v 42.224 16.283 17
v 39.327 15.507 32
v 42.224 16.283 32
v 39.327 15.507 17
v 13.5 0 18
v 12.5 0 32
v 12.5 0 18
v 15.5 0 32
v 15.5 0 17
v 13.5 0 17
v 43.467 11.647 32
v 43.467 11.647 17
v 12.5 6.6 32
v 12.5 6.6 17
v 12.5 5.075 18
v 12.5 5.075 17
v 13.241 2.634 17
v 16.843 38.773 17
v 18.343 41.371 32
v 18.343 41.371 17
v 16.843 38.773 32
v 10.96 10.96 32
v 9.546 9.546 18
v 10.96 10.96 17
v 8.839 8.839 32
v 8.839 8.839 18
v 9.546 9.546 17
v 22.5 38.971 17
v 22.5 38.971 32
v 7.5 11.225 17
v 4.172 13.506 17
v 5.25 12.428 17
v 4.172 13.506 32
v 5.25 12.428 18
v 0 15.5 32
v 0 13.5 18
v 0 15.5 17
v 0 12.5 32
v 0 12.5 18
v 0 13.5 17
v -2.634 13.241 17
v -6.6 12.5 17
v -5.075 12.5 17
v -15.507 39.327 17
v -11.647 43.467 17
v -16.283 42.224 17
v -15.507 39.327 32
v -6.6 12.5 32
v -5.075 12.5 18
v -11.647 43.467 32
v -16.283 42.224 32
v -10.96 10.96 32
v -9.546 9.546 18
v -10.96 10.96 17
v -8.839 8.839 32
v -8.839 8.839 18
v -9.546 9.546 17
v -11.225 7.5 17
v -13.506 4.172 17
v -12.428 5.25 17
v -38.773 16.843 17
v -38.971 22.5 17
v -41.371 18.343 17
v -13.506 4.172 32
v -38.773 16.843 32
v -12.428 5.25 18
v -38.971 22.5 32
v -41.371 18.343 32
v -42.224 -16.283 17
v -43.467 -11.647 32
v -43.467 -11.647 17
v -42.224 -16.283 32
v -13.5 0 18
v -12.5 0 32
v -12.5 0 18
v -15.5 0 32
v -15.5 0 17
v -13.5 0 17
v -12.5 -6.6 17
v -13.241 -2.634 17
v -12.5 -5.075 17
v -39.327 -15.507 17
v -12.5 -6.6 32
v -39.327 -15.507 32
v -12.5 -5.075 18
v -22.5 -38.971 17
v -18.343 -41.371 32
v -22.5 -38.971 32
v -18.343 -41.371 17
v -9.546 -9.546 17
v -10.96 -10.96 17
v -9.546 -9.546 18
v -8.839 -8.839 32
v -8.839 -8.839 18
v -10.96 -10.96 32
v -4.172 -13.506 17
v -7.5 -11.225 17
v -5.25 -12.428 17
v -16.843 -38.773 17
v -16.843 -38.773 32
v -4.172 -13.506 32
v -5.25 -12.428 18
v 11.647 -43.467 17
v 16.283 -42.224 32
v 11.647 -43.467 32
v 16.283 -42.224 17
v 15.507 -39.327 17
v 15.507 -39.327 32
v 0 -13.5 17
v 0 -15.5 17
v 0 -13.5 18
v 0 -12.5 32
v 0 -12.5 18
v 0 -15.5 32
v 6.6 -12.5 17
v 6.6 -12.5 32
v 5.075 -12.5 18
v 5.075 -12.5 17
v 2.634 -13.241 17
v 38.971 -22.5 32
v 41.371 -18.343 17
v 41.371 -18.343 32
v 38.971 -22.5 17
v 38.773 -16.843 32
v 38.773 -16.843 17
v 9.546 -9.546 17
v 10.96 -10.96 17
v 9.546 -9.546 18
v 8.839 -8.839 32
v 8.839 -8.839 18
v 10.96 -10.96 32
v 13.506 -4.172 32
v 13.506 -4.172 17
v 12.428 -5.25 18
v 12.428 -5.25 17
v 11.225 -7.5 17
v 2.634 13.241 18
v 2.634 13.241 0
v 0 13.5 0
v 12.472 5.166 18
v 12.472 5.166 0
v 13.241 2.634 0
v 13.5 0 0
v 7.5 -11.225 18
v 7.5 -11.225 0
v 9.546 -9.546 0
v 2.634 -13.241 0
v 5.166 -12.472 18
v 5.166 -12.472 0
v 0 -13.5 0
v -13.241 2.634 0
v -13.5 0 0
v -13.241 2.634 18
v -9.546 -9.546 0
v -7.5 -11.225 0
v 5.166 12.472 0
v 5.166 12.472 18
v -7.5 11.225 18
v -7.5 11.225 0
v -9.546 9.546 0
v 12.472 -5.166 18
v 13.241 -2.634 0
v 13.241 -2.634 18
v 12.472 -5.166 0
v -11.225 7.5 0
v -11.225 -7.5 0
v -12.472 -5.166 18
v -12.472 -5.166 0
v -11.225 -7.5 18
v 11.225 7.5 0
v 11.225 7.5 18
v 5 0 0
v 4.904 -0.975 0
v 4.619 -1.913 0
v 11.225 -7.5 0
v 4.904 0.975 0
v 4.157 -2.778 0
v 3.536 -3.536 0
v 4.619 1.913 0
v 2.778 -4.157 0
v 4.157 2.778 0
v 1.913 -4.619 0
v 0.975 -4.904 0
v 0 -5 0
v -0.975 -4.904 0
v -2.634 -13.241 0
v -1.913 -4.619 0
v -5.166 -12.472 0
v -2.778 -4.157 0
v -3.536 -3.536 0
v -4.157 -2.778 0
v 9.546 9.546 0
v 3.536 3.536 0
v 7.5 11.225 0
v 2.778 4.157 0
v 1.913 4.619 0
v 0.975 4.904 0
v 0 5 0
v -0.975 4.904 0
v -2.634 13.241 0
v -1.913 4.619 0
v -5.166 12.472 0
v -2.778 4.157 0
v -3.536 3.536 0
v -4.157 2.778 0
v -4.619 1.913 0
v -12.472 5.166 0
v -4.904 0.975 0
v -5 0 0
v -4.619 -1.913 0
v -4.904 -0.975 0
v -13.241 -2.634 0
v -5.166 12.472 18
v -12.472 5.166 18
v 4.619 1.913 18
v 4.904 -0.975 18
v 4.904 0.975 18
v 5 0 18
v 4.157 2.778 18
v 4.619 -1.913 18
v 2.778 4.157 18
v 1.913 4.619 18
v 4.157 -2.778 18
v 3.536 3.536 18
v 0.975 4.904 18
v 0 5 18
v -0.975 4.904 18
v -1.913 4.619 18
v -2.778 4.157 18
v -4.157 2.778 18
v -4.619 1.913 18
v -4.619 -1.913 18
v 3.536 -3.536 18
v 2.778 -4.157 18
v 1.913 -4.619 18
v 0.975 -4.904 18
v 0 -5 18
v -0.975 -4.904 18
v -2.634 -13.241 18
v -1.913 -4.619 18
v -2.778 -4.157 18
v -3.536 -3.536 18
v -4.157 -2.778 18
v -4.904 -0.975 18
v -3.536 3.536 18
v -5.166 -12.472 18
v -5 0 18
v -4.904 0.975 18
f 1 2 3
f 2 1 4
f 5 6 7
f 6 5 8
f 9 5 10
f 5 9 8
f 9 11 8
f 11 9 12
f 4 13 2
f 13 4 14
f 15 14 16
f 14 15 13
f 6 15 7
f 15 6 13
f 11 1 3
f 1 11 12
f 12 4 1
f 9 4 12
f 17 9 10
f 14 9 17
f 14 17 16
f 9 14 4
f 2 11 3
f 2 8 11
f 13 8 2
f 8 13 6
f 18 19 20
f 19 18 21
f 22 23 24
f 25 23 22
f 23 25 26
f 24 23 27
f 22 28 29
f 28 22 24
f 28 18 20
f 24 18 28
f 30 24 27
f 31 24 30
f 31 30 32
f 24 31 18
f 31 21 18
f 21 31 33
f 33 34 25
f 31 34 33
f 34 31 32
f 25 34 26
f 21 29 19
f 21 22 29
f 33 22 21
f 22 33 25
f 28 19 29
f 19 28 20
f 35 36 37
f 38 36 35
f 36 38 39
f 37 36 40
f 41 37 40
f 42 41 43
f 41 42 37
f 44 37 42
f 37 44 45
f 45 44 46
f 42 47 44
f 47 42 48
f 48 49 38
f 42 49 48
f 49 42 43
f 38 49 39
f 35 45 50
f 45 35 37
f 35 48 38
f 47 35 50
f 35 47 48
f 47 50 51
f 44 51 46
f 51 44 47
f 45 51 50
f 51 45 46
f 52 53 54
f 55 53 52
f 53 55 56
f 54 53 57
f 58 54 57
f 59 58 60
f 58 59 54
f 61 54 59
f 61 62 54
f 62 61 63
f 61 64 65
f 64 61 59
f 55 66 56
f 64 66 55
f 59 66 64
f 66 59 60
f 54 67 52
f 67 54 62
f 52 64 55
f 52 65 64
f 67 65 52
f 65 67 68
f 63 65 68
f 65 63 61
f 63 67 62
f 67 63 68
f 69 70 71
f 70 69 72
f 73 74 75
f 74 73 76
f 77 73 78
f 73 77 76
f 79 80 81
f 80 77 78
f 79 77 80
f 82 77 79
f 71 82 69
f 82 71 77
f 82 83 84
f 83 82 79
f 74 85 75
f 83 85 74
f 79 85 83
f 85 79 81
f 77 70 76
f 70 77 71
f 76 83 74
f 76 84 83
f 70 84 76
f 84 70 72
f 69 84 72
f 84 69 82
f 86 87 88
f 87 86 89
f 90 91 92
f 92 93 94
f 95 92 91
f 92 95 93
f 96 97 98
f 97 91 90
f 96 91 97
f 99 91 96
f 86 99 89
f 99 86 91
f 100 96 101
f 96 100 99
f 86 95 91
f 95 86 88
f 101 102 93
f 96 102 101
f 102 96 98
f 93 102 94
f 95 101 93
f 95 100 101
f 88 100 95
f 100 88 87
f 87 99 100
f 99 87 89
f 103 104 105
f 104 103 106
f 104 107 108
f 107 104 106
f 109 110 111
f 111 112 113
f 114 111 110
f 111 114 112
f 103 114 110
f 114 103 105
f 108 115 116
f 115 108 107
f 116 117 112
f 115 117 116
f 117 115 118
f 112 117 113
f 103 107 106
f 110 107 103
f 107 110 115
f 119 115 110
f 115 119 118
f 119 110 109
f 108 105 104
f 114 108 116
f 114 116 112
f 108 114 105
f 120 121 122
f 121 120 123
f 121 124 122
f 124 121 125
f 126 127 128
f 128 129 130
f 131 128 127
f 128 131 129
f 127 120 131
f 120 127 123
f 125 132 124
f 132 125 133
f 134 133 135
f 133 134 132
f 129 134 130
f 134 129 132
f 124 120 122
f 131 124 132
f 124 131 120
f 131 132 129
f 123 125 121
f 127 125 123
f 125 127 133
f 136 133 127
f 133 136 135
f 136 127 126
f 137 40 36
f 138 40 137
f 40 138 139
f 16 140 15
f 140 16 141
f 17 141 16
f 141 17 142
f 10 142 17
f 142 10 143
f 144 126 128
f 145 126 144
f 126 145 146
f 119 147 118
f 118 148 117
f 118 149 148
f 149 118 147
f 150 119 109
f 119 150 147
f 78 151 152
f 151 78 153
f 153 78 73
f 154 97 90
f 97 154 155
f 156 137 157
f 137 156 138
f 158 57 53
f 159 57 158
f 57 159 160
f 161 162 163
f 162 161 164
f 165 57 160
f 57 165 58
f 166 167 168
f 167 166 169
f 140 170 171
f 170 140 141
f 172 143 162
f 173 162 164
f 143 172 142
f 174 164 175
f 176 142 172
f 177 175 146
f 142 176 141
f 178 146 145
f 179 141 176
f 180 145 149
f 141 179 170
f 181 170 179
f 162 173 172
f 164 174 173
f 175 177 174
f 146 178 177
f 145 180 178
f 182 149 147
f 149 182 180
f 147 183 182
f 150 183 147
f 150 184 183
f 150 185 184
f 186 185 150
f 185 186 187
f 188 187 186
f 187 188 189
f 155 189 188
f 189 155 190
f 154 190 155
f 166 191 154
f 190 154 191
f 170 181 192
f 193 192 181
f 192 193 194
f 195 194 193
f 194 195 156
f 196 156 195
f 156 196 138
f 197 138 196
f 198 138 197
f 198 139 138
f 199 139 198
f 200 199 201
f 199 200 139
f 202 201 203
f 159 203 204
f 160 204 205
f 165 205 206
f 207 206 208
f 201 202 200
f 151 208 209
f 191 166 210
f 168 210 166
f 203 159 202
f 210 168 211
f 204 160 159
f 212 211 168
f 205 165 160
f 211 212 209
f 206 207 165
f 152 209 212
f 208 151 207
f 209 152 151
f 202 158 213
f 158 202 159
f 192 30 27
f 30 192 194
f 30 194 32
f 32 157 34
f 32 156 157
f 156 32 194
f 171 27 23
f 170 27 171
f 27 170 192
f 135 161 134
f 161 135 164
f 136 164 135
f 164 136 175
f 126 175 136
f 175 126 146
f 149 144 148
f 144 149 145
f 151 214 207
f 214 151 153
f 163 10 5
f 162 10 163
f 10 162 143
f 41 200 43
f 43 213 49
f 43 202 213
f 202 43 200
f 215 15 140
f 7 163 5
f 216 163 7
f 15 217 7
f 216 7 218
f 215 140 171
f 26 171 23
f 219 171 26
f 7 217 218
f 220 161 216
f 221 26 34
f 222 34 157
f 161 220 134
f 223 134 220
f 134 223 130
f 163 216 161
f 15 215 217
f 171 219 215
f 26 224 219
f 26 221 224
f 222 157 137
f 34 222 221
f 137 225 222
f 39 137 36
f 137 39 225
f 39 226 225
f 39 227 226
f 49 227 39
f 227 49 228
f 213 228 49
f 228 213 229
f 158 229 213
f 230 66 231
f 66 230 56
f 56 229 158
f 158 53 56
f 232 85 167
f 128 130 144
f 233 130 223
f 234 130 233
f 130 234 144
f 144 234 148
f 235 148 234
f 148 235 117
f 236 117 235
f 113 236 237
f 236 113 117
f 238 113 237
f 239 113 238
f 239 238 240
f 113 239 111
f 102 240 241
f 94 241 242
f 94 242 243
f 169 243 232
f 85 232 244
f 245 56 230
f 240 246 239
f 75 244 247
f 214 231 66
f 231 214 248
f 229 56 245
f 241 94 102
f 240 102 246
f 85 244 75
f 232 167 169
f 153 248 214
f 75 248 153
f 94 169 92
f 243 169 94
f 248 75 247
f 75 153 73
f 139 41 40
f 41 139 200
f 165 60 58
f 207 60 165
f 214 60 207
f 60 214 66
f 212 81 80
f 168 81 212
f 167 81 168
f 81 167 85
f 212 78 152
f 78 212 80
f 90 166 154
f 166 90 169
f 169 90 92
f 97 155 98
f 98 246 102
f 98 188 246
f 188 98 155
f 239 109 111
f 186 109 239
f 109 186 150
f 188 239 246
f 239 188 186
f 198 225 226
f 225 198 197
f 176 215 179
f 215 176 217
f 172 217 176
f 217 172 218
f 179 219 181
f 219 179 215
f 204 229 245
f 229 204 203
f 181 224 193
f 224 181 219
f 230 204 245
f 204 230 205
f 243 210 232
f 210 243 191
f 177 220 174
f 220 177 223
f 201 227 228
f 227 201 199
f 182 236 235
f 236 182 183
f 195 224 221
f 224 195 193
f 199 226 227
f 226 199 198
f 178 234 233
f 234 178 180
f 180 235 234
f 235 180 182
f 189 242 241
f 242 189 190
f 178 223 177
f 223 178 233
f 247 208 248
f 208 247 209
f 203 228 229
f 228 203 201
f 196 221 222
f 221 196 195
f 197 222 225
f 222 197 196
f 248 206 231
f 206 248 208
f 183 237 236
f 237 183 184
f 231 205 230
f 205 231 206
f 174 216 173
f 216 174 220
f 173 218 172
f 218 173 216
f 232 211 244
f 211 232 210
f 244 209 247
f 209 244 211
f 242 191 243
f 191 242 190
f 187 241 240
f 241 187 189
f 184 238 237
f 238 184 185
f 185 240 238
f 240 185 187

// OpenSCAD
$fn = 32;

// ----------------------------------------------------------------------
// Impeller: 90 mm, 8 blades, 32 mm tall
// ----------------------------------------------------------------------

// --- parameters (mm) ---
center_d = 27;            // hub diameter
center_h = 18;            // hub height
wheel_d = 90;             // outer diameter over the blades
blade_count = 8;          // number of blades
blade_t = 3;              // blade thickness
blade_h = 14;             // blade height
blade_in_r = 12.5;        // blade root radius
blade_out_r = 42;         // blade tip radius
sweep = 15;               // blade sweep, degrees
bore_d = 10;              // shaft bore

module hub() {
  cylinder(h = center_h, d = center_d);
}

module blade() {
  /* blade swept between two boxes: hull of the root and the tip section */
  hull() {
    translate([blade_in_r, 0, center_h - 1])
      cube([blade_t, blade_t * 2.2, blade_h + 1], center = false);
    rotate([0, 0, sweep])
      translate([blade_out_r, 0, center_h - 1])
        cube([blade_t, blade_t * 1.6, blade_h + 1], center = false);
  }
}

module blades() {
  for (i = [0 : blade_count - 1])
    rotate([0, 0, i * 360 / blade_count]) blade();
}

difference() {
  union() {
    hub();
    blades();
  }
  translate([0, 0, -1]) cylinder(h = center_h + blade_h + 0 + 3, d = bore_d);
}
